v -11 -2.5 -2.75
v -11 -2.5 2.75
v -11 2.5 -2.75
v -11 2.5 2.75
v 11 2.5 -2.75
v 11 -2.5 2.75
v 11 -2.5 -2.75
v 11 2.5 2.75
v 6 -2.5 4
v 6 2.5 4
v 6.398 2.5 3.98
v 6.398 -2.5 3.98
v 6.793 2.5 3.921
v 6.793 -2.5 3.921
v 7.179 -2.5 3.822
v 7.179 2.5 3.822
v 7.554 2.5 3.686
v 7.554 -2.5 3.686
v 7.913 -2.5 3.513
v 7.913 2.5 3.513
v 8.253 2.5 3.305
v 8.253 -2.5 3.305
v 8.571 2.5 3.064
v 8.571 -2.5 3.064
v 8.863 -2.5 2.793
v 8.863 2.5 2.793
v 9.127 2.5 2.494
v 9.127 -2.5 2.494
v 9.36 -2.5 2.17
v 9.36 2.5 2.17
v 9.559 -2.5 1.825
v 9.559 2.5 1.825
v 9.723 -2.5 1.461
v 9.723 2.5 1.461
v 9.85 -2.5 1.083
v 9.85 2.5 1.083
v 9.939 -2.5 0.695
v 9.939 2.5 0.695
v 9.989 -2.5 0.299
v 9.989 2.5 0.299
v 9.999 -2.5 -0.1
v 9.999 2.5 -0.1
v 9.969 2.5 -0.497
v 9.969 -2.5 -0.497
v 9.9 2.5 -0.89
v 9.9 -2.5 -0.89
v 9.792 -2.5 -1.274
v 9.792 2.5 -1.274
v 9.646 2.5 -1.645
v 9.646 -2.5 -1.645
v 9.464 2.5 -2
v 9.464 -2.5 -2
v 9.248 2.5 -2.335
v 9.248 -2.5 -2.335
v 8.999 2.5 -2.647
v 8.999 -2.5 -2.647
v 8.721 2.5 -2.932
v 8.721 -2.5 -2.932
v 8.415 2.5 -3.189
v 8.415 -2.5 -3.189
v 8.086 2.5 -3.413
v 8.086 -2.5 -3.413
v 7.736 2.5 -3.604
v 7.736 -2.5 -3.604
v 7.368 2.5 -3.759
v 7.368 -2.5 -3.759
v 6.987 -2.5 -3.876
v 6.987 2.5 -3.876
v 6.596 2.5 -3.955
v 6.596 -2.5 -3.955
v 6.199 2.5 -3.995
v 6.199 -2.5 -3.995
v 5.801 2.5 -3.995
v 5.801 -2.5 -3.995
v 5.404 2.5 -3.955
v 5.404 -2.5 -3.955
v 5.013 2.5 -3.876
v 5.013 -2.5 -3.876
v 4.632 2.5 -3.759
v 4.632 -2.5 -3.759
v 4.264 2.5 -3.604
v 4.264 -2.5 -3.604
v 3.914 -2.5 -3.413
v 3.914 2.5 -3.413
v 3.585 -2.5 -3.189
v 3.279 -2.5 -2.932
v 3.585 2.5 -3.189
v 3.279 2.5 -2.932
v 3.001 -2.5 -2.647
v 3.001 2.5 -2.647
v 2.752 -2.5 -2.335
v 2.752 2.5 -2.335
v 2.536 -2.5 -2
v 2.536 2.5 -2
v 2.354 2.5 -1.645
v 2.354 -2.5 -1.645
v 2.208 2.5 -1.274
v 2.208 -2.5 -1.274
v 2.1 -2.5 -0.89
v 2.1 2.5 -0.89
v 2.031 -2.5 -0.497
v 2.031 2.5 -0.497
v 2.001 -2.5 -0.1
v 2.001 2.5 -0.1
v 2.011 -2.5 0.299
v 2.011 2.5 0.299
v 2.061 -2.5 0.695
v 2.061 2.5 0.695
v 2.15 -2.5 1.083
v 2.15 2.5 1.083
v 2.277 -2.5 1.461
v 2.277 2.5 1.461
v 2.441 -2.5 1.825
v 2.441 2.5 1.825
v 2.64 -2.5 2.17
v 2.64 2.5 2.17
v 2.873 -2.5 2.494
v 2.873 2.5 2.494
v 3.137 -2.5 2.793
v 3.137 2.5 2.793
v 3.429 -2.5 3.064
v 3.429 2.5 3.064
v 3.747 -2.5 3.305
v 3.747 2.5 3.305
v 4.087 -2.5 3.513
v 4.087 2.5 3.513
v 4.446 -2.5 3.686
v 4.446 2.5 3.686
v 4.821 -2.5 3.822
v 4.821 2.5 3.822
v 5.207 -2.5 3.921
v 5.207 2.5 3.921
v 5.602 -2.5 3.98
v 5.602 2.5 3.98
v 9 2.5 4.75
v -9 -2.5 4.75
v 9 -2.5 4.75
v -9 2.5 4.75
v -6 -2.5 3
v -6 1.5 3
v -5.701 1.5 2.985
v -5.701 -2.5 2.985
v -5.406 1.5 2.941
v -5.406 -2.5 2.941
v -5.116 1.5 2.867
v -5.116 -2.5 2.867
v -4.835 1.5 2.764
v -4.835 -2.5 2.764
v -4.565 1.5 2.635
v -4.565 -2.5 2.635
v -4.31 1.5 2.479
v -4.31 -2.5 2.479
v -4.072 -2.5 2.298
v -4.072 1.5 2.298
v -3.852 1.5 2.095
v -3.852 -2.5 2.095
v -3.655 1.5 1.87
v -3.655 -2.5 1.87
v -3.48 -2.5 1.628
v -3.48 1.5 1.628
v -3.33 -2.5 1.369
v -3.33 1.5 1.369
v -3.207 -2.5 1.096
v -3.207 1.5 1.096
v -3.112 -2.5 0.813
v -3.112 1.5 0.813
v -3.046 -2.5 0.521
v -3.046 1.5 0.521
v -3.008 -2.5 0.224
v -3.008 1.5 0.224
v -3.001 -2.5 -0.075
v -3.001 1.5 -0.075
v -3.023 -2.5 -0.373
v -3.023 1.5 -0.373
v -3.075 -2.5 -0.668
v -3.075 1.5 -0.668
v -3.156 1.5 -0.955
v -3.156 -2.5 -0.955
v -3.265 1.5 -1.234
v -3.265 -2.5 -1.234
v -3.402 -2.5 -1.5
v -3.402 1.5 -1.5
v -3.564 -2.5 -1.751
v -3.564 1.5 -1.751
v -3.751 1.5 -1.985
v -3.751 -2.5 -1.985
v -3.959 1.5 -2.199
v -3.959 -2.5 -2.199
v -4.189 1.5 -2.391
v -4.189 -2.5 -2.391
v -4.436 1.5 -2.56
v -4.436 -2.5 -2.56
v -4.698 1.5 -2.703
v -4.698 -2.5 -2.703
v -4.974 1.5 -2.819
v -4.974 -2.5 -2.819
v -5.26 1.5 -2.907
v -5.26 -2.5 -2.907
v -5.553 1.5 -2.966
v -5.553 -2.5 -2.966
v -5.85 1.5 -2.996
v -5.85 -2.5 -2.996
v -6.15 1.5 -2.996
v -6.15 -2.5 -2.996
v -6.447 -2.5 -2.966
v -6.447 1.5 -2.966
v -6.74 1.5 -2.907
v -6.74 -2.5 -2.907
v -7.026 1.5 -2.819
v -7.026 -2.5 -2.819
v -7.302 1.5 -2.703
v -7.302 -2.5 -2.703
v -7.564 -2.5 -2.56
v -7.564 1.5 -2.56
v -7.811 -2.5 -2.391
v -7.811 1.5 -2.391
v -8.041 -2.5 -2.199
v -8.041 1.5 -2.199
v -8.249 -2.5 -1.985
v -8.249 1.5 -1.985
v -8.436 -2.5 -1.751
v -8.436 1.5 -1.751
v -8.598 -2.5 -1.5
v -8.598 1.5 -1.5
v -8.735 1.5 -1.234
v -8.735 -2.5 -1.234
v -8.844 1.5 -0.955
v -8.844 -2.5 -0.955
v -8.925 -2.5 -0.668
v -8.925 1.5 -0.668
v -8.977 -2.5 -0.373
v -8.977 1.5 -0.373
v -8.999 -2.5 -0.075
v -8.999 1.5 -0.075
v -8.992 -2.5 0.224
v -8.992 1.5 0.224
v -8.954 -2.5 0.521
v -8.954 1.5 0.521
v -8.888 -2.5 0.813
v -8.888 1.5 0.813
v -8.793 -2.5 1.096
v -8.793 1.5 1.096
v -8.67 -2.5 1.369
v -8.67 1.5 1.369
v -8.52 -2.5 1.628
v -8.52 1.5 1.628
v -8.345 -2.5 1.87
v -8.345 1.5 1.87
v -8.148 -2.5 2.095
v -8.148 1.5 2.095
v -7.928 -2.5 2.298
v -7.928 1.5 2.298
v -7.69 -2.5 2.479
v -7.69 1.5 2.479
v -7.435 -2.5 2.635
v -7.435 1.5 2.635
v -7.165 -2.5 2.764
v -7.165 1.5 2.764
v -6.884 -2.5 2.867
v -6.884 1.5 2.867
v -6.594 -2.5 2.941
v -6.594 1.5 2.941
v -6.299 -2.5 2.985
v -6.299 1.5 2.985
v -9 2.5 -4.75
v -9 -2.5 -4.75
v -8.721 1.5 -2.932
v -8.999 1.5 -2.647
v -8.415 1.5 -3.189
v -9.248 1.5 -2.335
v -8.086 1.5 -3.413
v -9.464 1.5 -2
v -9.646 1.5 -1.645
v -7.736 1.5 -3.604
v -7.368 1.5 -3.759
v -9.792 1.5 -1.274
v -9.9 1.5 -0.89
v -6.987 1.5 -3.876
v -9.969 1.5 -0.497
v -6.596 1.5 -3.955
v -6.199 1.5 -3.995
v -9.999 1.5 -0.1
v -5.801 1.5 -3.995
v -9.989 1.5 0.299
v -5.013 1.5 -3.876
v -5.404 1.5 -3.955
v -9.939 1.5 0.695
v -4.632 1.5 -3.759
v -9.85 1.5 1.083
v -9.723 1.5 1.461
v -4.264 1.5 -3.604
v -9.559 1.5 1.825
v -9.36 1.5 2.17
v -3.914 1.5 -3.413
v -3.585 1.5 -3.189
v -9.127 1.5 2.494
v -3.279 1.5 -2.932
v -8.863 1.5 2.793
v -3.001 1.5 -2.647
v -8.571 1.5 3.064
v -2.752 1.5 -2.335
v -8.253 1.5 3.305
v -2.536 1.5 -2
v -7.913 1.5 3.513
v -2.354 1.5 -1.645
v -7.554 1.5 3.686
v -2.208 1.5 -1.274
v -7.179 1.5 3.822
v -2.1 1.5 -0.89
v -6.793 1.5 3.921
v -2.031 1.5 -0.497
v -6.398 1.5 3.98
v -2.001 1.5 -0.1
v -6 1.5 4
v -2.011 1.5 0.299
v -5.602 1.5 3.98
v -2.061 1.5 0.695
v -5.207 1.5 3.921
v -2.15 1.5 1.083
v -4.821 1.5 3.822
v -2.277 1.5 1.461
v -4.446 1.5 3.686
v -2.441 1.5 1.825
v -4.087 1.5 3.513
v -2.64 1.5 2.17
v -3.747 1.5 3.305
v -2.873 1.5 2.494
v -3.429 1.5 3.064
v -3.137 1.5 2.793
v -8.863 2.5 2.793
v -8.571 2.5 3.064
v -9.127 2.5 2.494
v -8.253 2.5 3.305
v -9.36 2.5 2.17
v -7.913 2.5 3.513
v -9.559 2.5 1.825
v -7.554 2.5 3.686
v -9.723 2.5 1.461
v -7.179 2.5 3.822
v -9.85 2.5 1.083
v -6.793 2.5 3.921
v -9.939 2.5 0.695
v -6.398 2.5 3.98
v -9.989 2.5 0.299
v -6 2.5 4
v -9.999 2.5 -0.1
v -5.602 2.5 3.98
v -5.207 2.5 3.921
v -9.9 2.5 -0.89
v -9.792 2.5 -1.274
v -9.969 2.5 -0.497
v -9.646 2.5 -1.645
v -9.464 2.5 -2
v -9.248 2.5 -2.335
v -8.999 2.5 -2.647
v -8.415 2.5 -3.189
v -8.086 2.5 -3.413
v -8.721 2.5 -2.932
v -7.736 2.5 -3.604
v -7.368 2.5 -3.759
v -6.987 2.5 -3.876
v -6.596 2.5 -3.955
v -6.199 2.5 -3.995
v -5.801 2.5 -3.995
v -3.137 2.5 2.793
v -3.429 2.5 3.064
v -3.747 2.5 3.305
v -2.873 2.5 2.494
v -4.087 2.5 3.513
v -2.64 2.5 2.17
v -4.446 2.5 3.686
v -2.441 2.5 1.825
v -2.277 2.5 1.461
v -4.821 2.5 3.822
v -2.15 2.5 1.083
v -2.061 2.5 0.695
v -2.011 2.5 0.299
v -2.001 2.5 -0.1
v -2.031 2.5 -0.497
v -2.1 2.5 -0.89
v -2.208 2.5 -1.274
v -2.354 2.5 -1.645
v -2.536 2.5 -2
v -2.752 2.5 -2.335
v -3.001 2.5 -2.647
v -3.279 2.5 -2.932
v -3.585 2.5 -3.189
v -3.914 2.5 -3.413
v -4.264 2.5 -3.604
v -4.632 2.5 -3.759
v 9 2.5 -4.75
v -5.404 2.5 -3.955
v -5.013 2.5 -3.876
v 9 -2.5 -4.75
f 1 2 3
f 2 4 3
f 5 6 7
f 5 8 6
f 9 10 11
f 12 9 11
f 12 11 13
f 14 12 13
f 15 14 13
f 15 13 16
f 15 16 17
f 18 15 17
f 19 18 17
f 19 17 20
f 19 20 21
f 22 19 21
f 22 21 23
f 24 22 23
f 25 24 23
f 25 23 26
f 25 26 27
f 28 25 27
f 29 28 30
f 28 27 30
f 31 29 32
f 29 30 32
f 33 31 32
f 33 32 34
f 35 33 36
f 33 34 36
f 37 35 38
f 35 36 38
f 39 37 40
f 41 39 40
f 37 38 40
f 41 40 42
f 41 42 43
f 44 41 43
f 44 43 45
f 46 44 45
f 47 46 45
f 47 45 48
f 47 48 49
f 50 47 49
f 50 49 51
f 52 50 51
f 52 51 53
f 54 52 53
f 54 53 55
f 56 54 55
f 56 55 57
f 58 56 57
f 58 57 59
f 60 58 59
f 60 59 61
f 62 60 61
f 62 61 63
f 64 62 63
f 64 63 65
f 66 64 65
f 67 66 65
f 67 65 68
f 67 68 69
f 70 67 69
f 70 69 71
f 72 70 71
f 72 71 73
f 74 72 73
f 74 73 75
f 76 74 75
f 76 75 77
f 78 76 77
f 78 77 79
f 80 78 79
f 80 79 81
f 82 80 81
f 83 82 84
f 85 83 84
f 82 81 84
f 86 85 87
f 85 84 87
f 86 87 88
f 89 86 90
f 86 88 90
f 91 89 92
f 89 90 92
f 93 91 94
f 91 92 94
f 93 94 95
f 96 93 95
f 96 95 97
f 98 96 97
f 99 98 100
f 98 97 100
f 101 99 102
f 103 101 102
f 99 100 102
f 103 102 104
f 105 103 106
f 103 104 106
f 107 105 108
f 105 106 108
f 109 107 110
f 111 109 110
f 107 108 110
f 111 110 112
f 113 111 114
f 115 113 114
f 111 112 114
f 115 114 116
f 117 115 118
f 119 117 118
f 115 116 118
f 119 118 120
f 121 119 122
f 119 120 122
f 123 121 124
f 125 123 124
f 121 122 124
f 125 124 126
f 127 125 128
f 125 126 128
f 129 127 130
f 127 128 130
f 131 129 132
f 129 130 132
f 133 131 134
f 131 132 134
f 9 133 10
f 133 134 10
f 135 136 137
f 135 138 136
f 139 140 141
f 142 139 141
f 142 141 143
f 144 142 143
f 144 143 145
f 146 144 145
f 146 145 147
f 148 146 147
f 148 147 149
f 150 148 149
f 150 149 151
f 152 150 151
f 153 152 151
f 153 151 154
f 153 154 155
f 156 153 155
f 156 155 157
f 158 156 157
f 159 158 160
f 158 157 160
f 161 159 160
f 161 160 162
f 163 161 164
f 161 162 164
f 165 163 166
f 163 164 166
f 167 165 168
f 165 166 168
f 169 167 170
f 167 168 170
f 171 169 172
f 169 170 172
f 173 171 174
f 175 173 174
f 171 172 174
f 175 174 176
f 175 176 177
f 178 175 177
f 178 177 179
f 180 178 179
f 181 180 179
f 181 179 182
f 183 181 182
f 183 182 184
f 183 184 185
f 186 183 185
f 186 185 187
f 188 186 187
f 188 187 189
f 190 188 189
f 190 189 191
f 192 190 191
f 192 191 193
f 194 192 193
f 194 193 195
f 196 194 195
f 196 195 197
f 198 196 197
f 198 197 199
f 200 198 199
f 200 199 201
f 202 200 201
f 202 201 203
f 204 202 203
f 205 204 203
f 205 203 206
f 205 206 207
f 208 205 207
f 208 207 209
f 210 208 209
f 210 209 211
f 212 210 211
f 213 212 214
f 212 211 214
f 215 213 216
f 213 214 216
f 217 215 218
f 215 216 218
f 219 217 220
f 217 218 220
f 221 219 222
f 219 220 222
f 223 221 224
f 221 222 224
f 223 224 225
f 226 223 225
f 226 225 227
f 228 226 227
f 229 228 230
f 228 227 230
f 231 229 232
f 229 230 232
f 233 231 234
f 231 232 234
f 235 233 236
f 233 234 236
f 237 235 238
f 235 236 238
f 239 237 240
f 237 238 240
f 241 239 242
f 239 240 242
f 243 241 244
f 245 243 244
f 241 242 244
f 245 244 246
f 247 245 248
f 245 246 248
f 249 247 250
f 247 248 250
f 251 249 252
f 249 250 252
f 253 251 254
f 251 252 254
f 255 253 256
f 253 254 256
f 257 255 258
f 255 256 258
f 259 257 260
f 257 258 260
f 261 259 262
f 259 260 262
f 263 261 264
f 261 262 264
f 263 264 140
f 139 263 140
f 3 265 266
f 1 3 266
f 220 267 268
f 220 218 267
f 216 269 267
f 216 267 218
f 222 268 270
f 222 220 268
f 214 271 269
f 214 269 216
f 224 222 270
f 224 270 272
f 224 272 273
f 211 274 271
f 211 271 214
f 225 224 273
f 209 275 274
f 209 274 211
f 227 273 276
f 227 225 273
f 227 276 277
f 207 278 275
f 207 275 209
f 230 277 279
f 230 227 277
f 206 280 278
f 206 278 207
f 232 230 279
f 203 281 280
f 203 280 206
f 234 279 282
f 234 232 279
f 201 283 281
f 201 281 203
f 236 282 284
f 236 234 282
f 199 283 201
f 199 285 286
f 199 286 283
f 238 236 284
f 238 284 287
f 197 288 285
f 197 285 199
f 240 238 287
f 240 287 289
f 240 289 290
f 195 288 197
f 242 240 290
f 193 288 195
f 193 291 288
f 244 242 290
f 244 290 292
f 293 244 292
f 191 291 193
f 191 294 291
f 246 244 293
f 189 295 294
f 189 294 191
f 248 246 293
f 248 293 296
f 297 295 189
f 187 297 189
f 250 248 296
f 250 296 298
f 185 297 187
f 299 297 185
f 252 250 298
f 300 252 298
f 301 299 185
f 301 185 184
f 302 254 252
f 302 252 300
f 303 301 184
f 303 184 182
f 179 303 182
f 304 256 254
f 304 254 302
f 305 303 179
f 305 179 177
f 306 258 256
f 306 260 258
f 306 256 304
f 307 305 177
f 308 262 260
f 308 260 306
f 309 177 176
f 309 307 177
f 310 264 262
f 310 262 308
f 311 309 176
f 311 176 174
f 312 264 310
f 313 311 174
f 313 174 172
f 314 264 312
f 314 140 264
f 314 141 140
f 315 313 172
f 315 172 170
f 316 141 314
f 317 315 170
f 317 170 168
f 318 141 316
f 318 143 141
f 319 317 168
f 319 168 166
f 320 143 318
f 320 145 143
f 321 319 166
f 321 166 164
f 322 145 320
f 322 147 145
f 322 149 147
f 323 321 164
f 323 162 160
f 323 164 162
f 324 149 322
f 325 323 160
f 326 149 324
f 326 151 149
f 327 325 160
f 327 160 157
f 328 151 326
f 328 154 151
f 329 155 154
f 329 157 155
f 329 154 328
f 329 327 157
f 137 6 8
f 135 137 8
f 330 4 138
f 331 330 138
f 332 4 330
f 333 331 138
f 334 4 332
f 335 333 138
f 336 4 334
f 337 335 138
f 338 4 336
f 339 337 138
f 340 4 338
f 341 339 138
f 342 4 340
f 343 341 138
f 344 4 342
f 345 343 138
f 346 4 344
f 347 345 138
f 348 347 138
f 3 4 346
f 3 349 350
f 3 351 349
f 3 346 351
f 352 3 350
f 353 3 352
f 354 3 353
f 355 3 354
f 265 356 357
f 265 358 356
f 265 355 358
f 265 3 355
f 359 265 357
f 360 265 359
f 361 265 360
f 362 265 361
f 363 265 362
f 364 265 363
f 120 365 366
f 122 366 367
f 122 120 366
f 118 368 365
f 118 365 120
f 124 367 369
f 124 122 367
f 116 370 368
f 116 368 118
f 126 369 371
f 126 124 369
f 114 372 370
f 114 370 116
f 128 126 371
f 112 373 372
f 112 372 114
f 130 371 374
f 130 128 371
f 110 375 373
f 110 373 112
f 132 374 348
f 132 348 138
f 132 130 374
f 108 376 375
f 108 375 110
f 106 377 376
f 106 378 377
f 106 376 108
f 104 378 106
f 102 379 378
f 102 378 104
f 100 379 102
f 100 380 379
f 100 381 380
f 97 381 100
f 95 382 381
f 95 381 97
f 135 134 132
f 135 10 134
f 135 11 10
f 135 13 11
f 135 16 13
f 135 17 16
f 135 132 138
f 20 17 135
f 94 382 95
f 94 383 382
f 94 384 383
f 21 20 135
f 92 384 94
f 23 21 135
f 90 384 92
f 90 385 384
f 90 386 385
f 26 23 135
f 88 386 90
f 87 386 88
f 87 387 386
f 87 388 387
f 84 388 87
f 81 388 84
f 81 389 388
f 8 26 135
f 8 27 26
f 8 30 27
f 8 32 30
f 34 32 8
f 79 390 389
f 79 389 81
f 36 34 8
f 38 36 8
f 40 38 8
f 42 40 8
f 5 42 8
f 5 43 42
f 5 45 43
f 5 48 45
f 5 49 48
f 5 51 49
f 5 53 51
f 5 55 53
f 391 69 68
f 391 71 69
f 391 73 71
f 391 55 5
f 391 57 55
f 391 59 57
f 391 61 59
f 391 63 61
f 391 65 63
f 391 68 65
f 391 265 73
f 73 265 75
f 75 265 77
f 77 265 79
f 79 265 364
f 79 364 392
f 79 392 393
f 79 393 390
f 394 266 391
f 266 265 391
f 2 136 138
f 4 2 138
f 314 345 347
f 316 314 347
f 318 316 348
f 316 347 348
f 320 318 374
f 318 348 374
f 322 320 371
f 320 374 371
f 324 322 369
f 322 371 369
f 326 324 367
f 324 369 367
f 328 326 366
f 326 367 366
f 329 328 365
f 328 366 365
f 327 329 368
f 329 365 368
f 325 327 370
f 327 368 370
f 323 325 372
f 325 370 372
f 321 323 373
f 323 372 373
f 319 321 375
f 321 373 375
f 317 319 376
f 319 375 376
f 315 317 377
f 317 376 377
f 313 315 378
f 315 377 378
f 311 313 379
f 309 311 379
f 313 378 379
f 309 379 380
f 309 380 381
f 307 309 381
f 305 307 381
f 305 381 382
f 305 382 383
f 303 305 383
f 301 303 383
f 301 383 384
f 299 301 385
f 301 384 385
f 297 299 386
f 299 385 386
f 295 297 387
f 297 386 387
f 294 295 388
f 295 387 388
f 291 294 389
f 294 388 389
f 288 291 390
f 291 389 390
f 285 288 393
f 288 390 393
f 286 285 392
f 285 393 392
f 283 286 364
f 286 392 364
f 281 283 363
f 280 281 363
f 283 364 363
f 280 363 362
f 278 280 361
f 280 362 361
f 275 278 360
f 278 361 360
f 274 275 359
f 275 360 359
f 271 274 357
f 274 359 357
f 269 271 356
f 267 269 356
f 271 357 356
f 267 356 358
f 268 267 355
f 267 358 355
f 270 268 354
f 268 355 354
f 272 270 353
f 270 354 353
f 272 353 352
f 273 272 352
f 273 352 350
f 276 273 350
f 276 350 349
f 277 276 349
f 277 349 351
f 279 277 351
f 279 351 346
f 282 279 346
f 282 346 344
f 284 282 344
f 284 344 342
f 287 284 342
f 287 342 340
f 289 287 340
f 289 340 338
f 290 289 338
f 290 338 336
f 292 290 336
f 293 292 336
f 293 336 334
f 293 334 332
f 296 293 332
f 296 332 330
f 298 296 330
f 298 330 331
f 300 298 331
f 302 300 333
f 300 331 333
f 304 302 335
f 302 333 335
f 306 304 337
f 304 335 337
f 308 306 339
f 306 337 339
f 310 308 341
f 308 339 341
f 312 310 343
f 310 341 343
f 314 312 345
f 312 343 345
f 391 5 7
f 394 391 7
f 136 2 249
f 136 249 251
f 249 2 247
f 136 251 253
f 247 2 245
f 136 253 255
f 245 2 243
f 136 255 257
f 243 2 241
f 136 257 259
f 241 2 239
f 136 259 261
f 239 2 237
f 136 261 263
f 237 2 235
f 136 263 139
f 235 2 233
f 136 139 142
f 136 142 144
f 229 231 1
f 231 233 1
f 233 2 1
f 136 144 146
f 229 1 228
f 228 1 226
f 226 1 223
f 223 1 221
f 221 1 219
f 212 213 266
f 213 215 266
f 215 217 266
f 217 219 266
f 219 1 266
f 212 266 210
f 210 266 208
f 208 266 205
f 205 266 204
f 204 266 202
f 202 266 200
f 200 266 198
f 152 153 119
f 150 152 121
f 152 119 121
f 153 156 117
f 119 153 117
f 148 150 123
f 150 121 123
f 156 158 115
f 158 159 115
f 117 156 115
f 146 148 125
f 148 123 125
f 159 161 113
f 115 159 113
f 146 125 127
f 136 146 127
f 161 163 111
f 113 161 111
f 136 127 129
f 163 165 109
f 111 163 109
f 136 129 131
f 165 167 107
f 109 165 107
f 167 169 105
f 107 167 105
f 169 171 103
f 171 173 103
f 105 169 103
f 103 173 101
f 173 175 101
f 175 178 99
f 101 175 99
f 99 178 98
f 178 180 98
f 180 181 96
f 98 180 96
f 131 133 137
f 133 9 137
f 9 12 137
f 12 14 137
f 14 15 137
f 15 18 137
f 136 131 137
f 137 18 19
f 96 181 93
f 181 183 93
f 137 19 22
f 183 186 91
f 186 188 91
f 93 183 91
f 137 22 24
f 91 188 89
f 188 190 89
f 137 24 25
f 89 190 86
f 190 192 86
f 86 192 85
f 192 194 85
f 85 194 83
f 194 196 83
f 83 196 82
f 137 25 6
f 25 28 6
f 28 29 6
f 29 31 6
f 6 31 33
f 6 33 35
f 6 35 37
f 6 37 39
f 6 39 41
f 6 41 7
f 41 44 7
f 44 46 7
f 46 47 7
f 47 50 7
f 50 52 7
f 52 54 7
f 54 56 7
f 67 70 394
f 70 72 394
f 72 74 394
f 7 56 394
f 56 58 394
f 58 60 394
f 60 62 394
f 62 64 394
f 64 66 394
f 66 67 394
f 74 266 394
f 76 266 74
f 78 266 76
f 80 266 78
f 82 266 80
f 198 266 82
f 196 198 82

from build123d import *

# Parameters (mm, degrees)
SKETCH_1_W          = 22
SKETCH_1_H          = 9.5
EXTRUDE_1_DEPTH     = 2.5
SKETCH_2_R          = 4
CUT_EXTRUDE_1_DEPTH = 13.983162173
SKETCH_3_R          = 4
CUT_EXTRUDE_2_DEPTH = 1
SKETCH_4_R          = 3
CUT_EXTRUDE_3_DEPTH = 13.631805097
CHAMFER_1_SIZE      = 2


with BuildPart() as part:
    # 草图1 → 凸台-拉伸1 (new, symmetric)
    with BuildSketch(Plane(origin=(0, 0, 0), x_dir=(1, 0, 0), z_dir=(0, 1, 0))):
        Rectangle(SKETCH_1_W, SKETCH_1_H)
    extrude(amount=EXTRUDE_1_DEPTH, both=True)

    # 草图2 → 切除-拉伸1 (cut, through all)
    with BuildSketch(Plane(origin=(0, 2.5, 0), x_dir=(1, 0, 0), z_dir=(0, 1, 0))):
        with Locations(Location((6, 0, 0), (0, 0, 270))):
            Circle(SKETCH_2_R)
    extrude(amount=-CUT_EXTRUDE_1_DEPTH, mode=Mode.SUBTRACT)

    # 草图3 → 切除-拉伸2 (cut)
    with BuildSketch(Plane(origin=(0, 2.5, 0), x_dir=(1, 0, 0), z_dir=(0, 1, 0))):
        with Locations(Location((-6, 0, 0), (0, 0, 270))):
            Circle(SKETCH_3_R)
    extrude(amount=-CUT_EXTRUDE_2_DEPTH, mode=Mode.SUBTRACT)

    # 草图4 → 切除-拉伸3 (cut, through all)
    with BuildSketch(Plane(origin=(0, 1.5, 0), x_dir=(1, 0, 0), z_dir=(0, 1, 0))):
        with Locations(Location((-6, 0, 0), (0, 0, 270))):
            Circle(SKETCH_4_R)
    extrude(amount=-CUT_EXTRUDE_3_DEPTH, mode=Mode.SUBTRACT)

    # 倒角1
    chamfer_1_edges = [part.edges().sort_by_distance(p)[0] for p in [
        (-11, 0, -4.75),
        (11, 0, -4.75),
        (11, 0, 4.75),
        (-11, 0, 4.75),
    ]]
    chamfer(chamfer_1_edges, length=CHAMFER_1_SIZE)


solid = part.part
